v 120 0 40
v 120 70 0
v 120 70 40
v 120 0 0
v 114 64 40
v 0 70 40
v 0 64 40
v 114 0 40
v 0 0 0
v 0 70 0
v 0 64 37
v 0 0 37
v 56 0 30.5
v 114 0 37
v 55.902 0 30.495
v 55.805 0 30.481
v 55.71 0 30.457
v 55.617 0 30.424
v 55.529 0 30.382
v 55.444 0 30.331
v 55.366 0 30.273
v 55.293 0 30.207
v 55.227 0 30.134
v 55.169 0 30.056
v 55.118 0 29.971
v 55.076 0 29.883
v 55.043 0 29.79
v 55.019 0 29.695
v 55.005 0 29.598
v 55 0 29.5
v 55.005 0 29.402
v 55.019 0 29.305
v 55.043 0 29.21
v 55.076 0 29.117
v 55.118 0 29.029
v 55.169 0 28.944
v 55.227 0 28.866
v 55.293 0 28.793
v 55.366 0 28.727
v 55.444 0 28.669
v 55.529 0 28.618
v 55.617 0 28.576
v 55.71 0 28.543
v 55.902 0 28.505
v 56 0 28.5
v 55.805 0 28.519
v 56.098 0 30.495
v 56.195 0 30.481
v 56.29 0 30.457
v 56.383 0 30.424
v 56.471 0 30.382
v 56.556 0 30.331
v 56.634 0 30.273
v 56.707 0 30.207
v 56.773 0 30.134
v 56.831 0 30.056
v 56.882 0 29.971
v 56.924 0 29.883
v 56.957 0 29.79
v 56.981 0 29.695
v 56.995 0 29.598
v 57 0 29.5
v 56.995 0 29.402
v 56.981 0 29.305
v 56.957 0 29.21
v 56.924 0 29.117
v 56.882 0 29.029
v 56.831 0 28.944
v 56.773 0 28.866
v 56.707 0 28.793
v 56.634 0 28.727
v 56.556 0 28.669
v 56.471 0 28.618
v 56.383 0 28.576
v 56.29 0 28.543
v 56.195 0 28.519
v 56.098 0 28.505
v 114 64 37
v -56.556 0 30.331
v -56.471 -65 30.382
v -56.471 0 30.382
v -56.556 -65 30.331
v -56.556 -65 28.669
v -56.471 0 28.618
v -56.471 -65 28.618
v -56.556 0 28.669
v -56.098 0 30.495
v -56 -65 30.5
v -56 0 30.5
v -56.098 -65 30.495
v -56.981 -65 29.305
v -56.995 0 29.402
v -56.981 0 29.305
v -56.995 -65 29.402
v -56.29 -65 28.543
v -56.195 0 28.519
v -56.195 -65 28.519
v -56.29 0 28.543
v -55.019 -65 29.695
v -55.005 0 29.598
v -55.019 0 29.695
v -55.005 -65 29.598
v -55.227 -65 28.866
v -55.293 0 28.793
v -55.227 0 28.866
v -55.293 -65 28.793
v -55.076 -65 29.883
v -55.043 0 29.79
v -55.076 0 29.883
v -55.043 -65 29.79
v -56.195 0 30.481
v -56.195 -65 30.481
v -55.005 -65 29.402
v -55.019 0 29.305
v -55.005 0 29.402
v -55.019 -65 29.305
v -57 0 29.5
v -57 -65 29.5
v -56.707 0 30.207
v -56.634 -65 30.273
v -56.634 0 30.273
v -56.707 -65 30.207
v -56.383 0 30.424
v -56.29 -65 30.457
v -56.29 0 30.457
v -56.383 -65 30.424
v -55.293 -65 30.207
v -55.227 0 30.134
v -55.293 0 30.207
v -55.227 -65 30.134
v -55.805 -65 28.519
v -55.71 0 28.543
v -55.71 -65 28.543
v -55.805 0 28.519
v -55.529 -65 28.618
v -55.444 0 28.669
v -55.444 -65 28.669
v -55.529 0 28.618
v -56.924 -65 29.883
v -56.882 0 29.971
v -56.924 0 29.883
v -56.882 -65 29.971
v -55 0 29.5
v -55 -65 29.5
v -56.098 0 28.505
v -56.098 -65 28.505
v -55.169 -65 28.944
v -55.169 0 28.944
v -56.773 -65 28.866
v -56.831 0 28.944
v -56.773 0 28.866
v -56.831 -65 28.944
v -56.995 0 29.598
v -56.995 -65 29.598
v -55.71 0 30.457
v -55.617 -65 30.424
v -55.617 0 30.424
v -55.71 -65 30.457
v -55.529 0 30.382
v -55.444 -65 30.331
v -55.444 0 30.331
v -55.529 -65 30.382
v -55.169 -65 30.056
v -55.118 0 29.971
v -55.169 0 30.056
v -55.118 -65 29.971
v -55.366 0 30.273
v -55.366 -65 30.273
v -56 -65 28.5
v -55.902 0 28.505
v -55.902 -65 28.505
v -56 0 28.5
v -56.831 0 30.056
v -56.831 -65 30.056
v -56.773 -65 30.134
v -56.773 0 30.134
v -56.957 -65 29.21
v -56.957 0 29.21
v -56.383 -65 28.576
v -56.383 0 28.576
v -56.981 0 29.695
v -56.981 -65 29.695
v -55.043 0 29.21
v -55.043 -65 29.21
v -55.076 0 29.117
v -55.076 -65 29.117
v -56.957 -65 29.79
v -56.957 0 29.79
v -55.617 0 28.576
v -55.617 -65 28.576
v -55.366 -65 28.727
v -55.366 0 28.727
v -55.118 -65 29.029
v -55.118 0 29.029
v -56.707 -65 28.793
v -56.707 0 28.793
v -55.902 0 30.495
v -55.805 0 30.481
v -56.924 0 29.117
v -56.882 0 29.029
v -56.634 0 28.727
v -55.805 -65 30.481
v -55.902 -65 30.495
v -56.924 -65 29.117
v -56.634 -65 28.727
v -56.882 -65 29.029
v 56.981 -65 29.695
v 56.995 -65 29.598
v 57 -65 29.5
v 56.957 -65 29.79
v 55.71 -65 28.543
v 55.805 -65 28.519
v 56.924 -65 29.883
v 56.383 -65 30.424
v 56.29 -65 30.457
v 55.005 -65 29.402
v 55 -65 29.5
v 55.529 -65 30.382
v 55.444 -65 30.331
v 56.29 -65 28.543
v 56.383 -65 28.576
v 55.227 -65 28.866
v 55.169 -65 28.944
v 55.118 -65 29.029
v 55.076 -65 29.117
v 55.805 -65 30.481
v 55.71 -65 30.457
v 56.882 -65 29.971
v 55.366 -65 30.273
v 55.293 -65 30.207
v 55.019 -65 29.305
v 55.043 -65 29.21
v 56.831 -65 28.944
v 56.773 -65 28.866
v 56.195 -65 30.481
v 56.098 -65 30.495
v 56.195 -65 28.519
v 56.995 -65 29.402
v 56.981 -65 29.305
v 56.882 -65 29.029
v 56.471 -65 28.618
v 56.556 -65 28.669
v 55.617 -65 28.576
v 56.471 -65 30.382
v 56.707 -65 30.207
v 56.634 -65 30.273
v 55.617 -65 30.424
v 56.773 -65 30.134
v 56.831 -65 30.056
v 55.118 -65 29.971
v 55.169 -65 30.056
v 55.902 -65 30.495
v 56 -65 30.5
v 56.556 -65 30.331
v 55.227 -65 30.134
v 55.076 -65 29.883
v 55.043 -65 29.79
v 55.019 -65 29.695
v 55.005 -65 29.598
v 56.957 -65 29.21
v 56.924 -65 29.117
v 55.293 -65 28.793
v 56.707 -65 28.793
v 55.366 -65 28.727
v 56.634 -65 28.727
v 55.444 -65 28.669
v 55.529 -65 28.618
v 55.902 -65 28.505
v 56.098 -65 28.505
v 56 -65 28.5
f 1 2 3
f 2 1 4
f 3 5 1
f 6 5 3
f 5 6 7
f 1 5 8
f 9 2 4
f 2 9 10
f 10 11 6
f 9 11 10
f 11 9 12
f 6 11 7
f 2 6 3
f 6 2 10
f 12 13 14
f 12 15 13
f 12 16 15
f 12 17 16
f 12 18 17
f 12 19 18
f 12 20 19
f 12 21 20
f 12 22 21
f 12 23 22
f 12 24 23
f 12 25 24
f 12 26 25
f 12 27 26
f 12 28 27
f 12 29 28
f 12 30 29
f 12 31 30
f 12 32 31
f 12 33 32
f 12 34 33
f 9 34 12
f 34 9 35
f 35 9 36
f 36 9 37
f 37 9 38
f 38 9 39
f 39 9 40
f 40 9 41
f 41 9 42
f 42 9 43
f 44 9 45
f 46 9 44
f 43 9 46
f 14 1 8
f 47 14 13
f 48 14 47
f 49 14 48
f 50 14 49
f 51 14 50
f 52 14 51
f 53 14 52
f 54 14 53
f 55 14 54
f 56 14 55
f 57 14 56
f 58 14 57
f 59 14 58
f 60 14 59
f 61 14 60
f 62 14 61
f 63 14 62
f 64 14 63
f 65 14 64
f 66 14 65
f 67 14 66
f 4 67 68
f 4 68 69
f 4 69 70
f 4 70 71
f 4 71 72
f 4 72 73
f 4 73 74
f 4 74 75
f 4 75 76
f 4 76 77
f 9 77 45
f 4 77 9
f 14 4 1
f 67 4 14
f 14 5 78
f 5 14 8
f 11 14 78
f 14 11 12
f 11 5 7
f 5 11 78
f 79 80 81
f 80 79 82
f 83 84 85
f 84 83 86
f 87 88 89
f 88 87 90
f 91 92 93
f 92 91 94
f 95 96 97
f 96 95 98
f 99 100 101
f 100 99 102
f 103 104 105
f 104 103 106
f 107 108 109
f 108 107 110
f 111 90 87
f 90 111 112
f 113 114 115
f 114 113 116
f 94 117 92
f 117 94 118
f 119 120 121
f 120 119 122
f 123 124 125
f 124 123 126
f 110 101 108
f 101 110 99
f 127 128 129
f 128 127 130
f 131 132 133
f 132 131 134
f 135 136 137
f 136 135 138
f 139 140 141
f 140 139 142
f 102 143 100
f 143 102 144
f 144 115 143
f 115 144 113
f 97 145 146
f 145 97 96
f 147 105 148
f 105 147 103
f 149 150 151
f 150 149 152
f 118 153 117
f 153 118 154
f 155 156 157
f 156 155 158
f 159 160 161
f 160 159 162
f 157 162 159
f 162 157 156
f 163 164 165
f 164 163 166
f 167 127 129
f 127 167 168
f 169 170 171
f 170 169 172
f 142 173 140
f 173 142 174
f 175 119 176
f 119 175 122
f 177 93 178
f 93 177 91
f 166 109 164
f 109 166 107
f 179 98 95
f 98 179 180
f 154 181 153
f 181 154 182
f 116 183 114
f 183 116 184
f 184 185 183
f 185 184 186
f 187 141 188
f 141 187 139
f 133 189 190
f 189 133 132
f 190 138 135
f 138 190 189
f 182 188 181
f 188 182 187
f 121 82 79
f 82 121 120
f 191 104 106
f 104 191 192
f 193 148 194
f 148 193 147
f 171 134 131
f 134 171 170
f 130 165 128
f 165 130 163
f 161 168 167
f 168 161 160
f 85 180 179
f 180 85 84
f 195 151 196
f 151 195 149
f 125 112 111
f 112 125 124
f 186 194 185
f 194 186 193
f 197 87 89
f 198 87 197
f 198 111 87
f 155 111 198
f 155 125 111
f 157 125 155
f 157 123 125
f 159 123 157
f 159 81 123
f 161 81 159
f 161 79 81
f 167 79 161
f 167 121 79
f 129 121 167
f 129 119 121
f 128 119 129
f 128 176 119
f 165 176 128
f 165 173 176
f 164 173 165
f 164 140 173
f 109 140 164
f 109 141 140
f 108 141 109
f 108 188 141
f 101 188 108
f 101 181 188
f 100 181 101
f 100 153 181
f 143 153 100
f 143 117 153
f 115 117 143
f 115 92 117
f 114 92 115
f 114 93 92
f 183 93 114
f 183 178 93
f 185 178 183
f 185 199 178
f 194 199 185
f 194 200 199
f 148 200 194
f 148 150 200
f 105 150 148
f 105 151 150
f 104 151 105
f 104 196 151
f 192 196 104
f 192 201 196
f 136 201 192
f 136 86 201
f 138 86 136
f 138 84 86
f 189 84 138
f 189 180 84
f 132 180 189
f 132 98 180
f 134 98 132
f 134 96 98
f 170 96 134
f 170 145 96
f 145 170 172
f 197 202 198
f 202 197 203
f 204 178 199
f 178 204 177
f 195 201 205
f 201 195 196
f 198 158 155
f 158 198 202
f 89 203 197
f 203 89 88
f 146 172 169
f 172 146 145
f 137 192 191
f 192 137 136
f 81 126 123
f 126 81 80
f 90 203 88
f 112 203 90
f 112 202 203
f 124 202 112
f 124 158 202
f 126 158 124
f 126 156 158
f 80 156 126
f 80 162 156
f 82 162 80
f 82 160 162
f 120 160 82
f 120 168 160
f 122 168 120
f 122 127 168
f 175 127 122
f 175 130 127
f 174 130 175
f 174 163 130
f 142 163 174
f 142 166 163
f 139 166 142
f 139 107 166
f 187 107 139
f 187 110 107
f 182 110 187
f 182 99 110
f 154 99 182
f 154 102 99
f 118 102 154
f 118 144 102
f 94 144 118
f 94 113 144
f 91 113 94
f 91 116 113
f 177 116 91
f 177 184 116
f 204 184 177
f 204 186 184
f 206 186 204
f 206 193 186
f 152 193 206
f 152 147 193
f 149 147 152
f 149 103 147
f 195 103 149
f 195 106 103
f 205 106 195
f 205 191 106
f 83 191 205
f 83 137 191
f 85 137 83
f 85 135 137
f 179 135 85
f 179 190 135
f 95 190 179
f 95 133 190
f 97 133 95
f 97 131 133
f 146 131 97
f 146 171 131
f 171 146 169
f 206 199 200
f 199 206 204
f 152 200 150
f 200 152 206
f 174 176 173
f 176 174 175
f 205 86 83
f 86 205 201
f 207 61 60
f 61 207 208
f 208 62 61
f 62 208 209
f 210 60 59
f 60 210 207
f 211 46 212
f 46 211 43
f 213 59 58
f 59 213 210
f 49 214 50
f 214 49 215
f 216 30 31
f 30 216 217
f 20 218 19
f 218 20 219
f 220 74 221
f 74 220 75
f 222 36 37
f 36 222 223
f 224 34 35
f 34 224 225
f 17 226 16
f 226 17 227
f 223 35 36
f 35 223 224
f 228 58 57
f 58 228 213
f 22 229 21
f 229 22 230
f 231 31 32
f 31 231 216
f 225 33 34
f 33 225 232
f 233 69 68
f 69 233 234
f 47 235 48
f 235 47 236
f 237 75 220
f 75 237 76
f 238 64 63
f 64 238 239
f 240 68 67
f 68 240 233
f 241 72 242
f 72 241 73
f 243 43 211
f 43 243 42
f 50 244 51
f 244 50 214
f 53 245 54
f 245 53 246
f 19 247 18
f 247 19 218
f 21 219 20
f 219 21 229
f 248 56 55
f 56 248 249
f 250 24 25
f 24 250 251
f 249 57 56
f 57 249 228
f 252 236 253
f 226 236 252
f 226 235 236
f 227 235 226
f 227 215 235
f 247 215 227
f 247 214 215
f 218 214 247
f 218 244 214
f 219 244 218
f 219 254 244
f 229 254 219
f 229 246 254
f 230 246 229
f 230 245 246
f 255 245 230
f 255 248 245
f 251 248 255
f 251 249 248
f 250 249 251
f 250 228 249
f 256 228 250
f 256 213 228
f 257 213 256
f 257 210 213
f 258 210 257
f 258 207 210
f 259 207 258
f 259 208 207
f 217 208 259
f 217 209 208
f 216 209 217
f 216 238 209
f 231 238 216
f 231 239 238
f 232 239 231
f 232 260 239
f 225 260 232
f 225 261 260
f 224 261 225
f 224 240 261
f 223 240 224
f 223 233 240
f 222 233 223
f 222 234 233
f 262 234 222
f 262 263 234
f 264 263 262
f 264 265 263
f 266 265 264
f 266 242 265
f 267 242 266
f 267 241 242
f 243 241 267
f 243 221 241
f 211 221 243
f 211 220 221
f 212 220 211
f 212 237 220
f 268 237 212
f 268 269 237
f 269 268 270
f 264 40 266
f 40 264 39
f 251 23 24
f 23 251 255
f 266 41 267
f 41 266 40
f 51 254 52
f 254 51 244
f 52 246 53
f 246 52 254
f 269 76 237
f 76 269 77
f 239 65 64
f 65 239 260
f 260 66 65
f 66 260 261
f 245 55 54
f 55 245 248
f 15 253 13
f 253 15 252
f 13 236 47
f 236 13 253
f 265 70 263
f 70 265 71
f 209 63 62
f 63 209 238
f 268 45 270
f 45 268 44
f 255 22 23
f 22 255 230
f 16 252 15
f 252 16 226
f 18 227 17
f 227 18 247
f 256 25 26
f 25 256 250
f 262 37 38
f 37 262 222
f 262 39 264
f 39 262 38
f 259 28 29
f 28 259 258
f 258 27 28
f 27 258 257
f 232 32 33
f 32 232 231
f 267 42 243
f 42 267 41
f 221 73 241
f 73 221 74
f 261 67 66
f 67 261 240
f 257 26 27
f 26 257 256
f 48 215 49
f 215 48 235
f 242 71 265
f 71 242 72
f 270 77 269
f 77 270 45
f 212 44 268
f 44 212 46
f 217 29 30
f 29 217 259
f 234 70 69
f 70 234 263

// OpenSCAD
// Mini horizontal gel-electrophoresis box - buffer tank
// Print orientation: base on XY plane, open top, builds up +Z

$fn = 64;

// ---- Tank dimensions ----
tank_x = 120;      // outer length (X)
tank_y = 70;       // width (Y)
tank_z = 40;       // height (Z)
wall   = 3;        // wall thickness
floor  = 3;        // floor thickness

// ---- Platform ----
plat_len   = 60;   // platform length in X
plat_top_z = 13;   // top of platform (10 mm above inner floor)

// ---- Electrode holes ----
hole_d     = 2;    // hole diameter
hole_y     = 0;    // hole Y position
hole_z     = 30;   // hole Z position

// ---- Derived ----
inner_x = tank_x - 2*wall;
inner_y = tank_y - 2*wall;
inner_z = tank_z - floor;
eps     = 0.5;     // cutter overshoot

union() {
    // Tank body
    difference() {
        cube([tank_x, tank_y, tank_z]);
        // Open top
        translate([0, 0, tank_z - floor])
            cube([inner_x, inner_y, inner_z]);
    }

    // Raised platform
    translate([(tank_x - plat_len)/2, 0, tank_z - floor])
        cube([plat_len, tank_y, plat_top_z - (tank_z - floor) + 0.01]);

    // Electrode holes
    for (sx = [-1, 1])
        translate([sx * (inner_x/2 - hole_d/2), hole_y, hole_z - eps])
            rotate([90, 0, 0])
                cylinder(d = hole_d, h = inner_y + 2*eps);
}
